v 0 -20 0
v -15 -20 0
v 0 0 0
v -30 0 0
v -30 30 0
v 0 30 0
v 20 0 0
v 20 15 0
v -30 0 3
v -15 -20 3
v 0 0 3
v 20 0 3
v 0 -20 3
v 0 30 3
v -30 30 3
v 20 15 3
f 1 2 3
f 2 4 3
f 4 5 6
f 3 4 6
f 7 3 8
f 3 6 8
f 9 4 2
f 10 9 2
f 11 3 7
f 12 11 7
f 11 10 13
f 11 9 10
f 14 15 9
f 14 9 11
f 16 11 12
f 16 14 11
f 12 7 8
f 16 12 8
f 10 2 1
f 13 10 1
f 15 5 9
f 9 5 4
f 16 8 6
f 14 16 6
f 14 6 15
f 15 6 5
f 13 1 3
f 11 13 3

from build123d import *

# Parameters (mm, degrees)
F0_W     = 15
F0_H     = 15
F0_W_2   = 20
F0_H_2   = 20
F1_DEPTH = 3


with BuildPart() as f1:
    # F0 (on Top) → F1 (new body)
    with BuildSketch(Plane.XY):
        Polygon((-30, 0), (-15, 0), (-15, 15), (0, 15), (0, 30), (-30, 30), align=None)
        with Locations((-7.5, 7.5)):
            Rectangle(F0_W, F0_H)
        with Locations((10, 7.5)):
            Rectangle(F0_W_2, F0_H)
        with Locations((-7.5, -10)):
            Rectangle(F0_W, F0_H_2)
        Polygon((0, 30), (0, 15), (20, 15), align=None)
        Polygon((-15, -20), (-15, 0), (-30, 0), align=None)
    extrude(amount=F1_DEPTH)


solid = f1.part
